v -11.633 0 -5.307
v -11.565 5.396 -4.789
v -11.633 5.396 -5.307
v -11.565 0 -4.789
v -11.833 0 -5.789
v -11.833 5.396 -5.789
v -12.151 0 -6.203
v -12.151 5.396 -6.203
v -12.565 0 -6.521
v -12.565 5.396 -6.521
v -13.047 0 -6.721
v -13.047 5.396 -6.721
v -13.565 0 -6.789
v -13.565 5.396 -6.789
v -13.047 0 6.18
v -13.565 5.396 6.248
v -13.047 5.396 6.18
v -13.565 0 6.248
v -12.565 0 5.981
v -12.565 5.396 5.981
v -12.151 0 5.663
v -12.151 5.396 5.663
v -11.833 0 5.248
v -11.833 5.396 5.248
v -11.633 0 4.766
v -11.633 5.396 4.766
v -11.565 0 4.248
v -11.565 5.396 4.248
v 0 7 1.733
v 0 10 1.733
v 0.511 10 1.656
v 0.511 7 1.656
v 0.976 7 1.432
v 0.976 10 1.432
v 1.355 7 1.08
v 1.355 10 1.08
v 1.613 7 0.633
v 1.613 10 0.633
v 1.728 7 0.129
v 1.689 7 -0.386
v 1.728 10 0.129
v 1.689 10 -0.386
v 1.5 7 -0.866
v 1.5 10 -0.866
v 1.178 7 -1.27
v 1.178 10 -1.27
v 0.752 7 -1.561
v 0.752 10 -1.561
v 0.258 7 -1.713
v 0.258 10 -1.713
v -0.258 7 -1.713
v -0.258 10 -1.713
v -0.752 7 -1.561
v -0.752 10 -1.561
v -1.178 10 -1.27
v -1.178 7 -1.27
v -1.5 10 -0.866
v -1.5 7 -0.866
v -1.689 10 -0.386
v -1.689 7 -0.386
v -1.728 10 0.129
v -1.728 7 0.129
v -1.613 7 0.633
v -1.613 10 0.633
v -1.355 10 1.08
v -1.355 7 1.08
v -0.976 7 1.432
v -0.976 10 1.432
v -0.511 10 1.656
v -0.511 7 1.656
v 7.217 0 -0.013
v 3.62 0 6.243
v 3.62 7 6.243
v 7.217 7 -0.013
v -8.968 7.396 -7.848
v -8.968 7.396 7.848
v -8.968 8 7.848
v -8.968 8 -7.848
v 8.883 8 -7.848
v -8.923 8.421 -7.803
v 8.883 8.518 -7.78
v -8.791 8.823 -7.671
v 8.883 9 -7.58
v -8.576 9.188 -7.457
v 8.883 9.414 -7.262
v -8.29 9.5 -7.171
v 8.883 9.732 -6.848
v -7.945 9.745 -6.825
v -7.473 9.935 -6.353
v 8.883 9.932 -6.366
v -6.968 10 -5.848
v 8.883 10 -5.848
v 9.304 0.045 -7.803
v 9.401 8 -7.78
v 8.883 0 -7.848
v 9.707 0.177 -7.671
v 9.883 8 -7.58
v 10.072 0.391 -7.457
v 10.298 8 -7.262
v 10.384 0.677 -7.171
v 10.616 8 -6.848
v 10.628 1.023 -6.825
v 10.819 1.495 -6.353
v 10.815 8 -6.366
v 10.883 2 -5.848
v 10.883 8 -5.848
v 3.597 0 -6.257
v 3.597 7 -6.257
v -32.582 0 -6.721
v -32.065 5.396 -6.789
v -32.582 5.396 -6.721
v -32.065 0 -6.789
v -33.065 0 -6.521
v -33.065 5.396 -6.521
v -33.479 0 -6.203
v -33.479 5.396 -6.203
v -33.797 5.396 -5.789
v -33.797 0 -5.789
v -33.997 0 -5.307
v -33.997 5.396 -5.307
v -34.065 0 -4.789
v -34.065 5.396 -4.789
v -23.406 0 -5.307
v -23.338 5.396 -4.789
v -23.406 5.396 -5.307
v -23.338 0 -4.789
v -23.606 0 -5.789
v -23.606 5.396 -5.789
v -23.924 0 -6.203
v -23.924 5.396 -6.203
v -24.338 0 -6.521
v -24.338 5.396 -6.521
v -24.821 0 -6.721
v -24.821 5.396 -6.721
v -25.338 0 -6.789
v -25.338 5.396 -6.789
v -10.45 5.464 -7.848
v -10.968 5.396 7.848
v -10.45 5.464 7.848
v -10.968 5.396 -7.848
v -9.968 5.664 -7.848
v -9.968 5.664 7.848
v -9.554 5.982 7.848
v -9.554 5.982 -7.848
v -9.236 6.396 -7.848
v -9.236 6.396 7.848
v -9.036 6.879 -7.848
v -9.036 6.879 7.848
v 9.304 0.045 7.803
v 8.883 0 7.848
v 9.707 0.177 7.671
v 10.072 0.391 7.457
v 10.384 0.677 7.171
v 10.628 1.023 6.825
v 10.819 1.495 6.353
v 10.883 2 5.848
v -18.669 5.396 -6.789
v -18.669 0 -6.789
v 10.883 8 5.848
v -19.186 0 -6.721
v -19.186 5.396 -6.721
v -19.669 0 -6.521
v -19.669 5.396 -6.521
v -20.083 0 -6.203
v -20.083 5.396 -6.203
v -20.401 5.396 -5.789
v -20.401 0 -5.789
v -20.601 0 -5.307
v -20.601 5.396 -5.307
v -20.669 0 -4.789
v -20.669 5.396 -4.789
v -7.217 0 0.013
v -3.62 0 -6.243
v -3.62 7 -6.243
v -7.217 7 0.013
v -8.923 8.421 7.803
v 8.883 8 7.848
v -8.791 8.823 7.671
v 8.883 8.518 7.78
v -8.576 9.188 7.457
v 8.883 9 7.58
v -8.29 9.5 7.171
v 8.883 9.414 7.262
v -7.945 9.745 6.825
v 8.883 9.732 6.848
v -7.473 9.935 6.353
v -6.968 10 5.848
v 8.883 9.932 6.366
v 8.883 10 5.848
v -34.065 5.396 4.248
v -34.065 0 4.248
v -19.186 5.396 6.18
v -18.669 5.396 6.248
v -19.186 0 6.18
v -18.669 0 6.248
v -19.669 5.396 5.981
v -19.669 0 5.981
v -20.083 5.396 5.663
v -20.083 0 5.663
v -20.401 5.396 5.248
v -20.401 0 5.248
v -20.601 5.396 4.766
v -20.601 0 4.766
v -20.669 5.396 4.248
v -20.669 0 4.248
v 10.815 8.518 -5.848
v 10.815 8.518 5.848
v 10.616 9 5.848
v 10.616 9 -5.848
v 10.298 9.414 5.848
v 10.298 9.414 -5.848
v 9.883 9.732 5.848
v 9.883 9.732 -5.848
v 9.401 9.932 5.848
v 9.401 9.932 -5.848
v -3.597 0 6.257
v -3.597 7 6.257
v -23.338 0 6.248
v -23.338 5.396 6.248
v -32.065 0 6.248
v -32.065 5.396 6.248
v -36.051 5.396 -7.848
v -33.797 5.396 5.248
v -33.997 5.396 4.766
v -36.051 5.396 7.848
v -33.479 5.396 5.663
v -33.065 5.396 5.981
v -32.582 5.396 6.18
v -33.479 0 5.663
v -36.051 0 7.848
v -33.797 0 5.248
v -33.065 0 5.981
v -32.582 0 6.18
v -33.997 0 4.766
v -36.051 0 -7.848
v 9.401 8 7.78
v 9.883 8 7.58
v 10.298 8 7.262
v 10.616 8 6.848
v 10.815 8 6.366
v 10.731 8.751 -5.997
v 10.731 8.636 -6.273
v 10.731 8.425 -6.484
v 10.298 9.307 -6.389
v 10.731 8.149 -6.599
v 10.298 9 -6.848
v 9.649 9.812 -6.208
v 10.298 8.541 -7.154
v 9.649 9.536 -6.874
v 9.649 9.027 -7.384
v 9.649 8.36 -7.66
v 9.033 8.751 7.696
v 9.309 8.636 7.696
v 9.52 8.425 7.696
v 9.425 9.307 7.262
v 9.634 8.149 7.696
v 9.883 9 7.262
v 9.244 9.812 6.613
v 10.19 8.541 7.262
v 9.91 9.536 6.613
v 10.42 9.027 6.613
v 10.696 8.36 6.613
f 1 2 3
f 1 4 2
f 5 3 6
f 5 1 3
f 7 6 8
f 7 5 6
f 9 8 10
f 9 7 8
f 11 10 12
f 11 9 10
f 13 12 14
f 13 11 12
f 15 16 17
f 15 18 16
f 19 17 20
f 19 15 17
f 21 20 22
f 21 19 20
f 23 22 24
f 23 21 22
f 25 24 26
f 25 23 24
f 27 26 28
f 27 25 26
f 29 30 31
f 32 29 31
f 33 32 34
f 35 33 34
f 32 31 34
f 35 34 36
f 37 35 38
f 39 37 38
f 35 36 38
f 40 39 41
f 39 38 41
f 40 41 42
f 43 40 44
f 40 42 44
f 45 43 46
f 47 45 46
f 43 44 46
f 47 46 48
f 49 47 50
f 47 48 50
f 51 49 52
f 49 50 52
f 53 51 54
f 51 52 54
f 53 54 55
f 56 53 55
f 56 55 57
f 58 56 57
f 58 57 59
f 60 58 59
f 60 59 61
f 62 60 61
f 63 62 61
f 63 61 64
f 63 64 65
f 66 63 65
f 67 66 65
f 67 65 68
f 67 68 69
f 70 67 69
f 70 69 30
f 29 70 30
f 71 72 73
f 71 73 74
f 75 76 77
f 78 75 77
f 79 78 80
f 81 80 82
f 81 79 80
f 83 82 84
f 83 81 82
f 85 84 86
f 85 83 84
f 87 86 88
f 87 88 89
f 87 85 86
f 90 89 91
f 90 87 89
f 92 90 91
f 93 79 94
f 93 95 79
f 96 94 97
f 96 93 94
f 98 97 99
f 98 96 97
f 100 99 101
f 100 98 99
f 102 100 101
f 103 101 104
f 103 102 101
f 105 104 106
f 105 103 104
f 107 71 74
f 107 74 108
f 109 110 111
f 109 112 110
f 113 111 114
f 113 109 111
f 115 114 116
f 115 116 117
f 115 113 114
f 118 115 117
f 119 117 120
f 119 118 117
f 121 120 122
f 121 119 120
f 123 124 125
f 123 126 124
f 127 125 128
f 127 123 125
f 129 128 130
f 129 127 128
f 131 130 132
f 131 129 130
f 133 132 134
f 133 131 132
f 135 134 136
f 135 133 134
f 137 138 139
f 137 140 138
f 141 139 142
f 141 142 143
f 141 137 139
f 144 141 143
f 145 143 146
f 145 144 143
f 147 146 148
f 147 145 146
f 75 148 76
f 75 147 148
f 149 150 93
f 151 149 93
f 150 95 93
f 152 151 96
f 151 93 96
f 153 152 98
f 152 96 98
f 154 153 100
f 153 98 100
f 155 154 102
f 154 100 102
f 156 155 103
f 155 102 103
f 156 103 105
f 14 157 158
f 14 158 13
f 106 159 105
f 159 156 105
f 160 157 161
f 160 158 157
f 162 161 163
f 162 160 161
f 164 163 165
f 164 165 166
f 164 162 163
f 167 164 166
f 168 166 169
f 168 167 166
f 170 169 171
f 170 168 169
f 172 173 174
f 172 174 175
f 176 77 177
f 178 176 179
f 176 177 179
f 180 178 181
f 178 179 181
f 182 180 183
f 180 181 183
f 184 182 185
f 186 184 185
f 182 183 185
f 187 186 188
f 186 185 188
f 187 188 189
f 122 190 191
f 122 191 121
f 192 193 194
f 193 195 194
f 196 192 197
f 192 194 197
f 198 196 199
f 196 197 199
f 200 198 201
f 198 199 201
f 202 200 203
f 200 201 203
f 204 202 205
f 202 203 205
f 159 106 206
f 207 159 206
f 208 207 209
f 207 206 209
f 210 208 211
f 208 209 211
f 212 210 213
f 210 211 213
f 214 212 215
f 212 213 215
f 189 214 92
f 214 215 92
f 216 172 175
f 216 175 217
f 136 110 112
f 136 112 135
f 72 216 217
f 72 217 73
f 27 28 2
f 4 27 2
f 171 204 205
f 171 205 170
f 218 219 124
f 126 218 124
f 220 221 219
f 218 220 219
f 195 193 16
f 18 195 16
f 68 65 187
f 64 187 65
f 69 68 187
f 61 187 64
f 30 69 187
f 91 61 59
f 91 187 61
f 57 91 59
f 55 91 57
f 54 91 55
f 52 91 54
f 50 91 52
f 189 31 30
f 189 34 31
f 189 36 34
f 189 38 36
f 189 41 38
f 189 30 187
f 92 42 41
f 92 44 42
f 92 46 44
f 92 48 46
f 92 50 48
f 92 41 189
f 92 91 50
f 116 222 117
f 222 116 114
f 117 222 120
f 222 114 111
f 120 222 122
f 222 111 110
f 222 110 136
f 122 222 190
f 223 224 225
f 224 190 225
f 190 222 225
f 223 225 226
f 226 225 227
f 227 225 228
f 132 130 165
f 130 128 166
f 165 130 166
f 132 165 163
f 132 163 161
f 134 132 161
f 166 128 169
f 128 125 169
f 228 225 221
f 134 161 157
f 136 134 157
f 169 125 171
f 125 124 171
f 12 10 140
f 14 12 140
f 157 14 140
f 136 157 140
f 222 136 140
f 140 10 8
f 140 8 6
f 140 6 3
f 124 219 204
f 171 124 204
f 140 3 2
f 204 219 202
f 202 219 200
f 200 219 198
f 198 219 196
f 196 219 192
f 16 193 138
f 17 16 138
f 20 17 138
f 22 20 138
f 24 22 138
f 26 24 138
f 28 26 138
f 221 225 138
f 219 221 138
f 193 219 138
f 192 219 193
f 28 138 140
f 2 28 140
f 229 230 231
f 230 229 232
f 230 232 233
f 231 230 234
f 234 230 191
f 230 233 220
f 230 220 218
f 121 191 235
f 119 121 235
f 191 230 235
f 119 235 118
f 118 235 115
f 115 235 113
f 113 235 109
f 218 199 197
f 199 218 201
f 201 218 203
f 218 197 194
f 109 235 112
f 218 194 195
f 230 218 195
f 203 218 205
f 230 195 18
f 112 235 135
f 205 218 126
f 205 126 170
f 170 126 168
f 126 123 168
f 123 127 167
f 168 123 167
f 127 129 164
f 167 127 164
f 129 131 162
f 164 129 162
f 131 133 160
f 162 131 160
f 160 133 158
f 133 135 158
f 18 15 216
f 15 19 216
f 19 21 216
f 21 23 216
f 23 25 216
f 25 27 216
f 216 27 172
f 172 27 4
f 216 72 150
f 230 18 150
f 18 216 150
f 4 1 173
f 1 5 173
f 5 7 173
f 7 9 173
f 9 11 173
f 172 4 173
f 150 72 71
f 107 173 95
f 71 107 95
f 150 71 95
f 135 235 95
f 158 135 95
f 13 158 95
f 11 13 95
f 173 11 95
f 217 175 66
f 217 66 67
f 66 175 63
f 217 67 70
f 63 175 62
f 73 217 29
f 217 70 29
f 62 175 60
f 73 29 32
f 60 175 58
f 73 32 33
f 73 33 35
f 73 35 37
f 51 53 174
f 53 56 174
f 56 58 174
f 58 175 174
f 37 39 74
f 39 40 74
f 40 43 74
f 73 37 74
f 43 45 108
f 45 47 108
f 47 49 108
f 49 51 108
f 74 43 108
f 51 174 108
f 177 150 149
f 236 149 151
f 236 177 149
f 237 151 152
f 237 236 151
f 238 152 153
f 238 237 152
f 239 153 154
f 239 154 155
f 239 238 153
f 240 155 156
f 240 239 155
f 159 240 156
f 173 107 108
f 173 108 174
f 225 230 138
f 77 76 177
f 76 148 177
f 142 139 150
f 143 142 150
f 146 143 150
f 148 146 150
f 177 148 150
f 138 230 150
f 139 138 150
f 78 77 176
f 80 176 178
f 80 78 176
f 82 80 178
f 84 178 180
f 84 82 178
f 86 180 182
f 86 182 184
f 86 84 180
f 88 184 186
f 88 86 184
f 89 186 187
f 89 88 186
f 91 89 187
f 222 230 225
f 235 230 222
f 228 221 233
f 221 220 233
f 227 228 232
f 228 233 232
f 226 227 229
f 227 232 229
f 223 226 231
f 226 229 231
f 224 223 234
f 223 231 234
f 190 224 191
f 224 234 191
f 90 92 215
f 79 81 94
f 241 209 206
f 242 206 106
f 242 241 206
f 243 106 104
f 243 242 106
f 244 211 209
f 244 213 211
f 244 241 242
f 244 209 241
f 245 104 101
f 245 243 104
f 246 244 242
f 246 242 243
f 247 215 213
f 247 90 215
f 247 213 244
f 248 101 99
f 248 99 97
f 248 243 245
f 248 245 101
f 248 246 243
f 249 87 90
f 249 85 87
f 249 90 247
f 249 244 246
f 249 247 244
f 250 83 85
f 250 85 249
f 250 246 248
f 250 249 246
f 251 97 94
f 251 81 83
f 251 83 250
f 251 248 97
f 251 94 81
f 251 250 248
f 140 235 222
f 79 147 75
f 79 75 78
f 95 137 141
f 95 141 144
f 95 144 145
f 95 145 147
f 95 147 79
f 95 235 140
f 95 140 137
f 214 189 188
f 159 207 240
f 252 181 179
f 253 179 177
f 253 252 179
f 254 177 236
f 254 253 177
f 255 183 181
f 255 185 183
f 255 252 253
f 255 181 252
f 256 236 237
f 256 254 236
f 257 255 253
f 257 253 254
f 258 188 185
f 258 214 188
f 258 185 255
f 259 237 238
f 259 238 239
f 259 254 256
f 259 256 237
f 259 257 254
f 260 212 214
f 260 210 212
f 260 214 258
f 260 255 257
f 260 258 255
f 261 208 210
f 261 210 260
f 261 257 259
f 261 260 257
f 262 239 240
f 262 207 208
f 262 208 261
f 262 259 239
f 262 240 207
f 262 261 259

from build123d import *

# Parameters (mm, degrees)
SKETCH1_W           = 46.934067204
SKETCH1_H           = 15.695815502
BOSS_EXTRUDE1_DEPTH = 7
SKETCH2_W           = 46.934067204
SKETCH2_H           = 15.695815502
BOSS_EXTRUDE2_DEPTH = 3
SKETCH3_W           = 32.738111576
SKETCH3_H           = 6.605539494
CUT_EXTRUDE1_DEPTH  = 41.57096825
SKETCH4_W           = 9.10377614
SKETCH4_H           = 13.037427907
SKETCH4_W_2         = 10.726428155
CUT_EXTRUDE2_DEPTH  = 10
FILLET1_R           = 2
SKETCH5_R           = 1.732622303
CUT_EXTRUDE3_DEPTH  = 10


with BuildPart() as part:
    # Sketch1 → Boss-Extrude1 (new body)
    with BuildSketch(Plane(origin=(0, 0, 0), x_dir=(1, 0, 0), z_dir=(0, 1, 0))):
        with Locations((-12.583553639, 0)):
            Rectangle(SKETCH1_W, SKETCH1_H)
        Polygon((3.620053236, -6.243280219), (7.216865891, 0.013417956), (3.596812655, 6.256698176), (-3.620053236, 6.243280219), (-7.216865891, -0.013417956), (-3.596812655, -6.256698176), align=None, mode=Mode.SUBTRACT)
    extrude(amount=BOSS_EXTRUDE1_DEPTH)

    # Sketch2 → Boss-Extrude2 (add)
    with BuildSketch(Plane(origin=(0, 7, 0), x_dir=(1, 0, 0), z_dir=(0, 1, 0))):
        with Locations((-12.583553639, 0)):
            Rectangle(SKETCH2_W, SKETCH2_H)
    extrude(amount=BOSS_EXTRUDE2_DEPTH)

    # Sketch3 → Cut-Extrude1 (cut, through all)
    with BuildSketch(Plane.XY.offset(7.847907751)):
        with Locations((-25.336793279, 8.698923123)):
            Rectangle(SKETCH3_W, SKETCH3_H)
    extrude(amount=-CUT_EXTRUDE1_DEPTH, mode=Mode.SUBTRACT)

    # Sketch4 → Cut-Extrude2 (cut)
    with BuildSketch(Plane(origin=(0, 5.396153376, 0), x_dir=(1, 0, 0), z_dir=(0, 1, 0))):
        with Locations((-16.116840413, 0.270231687)):
            Rectangle(SKETCH4_W, SKETCH4_H)
        with Locations((-28.701467889, 0.270231687)):
            Rectangle(SKETCH4_W_2, SKETCH4_H)
    extrude(amount=-CUT_EXTRUDE2_DEPTH, mode=Mode.SUBTRACT)

    # Fillet1
    fillet1_edges = [part.edges().sort_by_distance(p)[0] for p in [
        (0.957871236, 10, -7.847907751),
        (10.883479963, 10, 0),
        (0.957871236, 10, 7.847907751),
        (-8.967737491, 10, 0),
        (10.883479963, 0, 0),
        (-8.967737491, 5.396153376, 0),
        (10.883479963, 5, 7.847907751),
        (10.883479963, 5, -7.847907751),
        (-20.668728483, 2.698076688, 6.248482266),
        (-20.668728483, 2.698076688, -6.788945641),
        (-11.564952343, 2.698076688, -6.788945641),
        (-11.564952343, 2.698076688, 6.248482266),
        (-23.338253811, 2.698076688, -6.788945641),
        (-34.064681966, 2.698076688, 6.248482266),
        (-34.064681966, 2.698076688, -6.788945641),
    ]]
    fillet(fillet1_edges, radius=FILLET1_R)

    # Sketch5 → Cut-Extrude3 (cut)
    with BuildSketch(Plane(origin=(0, 10, 0), x_dir=(1, 0, 0), z_dir=(0, 1, 0))):
        with Locations(Location((0, 0, 0), (0, 0, 270))):
            Circle(SKETCH5_R)
    extrude(amount=-CUT_EXTRUDE3_DEPTH, mode=Mode.SUBTRACT)


solid = part.part
